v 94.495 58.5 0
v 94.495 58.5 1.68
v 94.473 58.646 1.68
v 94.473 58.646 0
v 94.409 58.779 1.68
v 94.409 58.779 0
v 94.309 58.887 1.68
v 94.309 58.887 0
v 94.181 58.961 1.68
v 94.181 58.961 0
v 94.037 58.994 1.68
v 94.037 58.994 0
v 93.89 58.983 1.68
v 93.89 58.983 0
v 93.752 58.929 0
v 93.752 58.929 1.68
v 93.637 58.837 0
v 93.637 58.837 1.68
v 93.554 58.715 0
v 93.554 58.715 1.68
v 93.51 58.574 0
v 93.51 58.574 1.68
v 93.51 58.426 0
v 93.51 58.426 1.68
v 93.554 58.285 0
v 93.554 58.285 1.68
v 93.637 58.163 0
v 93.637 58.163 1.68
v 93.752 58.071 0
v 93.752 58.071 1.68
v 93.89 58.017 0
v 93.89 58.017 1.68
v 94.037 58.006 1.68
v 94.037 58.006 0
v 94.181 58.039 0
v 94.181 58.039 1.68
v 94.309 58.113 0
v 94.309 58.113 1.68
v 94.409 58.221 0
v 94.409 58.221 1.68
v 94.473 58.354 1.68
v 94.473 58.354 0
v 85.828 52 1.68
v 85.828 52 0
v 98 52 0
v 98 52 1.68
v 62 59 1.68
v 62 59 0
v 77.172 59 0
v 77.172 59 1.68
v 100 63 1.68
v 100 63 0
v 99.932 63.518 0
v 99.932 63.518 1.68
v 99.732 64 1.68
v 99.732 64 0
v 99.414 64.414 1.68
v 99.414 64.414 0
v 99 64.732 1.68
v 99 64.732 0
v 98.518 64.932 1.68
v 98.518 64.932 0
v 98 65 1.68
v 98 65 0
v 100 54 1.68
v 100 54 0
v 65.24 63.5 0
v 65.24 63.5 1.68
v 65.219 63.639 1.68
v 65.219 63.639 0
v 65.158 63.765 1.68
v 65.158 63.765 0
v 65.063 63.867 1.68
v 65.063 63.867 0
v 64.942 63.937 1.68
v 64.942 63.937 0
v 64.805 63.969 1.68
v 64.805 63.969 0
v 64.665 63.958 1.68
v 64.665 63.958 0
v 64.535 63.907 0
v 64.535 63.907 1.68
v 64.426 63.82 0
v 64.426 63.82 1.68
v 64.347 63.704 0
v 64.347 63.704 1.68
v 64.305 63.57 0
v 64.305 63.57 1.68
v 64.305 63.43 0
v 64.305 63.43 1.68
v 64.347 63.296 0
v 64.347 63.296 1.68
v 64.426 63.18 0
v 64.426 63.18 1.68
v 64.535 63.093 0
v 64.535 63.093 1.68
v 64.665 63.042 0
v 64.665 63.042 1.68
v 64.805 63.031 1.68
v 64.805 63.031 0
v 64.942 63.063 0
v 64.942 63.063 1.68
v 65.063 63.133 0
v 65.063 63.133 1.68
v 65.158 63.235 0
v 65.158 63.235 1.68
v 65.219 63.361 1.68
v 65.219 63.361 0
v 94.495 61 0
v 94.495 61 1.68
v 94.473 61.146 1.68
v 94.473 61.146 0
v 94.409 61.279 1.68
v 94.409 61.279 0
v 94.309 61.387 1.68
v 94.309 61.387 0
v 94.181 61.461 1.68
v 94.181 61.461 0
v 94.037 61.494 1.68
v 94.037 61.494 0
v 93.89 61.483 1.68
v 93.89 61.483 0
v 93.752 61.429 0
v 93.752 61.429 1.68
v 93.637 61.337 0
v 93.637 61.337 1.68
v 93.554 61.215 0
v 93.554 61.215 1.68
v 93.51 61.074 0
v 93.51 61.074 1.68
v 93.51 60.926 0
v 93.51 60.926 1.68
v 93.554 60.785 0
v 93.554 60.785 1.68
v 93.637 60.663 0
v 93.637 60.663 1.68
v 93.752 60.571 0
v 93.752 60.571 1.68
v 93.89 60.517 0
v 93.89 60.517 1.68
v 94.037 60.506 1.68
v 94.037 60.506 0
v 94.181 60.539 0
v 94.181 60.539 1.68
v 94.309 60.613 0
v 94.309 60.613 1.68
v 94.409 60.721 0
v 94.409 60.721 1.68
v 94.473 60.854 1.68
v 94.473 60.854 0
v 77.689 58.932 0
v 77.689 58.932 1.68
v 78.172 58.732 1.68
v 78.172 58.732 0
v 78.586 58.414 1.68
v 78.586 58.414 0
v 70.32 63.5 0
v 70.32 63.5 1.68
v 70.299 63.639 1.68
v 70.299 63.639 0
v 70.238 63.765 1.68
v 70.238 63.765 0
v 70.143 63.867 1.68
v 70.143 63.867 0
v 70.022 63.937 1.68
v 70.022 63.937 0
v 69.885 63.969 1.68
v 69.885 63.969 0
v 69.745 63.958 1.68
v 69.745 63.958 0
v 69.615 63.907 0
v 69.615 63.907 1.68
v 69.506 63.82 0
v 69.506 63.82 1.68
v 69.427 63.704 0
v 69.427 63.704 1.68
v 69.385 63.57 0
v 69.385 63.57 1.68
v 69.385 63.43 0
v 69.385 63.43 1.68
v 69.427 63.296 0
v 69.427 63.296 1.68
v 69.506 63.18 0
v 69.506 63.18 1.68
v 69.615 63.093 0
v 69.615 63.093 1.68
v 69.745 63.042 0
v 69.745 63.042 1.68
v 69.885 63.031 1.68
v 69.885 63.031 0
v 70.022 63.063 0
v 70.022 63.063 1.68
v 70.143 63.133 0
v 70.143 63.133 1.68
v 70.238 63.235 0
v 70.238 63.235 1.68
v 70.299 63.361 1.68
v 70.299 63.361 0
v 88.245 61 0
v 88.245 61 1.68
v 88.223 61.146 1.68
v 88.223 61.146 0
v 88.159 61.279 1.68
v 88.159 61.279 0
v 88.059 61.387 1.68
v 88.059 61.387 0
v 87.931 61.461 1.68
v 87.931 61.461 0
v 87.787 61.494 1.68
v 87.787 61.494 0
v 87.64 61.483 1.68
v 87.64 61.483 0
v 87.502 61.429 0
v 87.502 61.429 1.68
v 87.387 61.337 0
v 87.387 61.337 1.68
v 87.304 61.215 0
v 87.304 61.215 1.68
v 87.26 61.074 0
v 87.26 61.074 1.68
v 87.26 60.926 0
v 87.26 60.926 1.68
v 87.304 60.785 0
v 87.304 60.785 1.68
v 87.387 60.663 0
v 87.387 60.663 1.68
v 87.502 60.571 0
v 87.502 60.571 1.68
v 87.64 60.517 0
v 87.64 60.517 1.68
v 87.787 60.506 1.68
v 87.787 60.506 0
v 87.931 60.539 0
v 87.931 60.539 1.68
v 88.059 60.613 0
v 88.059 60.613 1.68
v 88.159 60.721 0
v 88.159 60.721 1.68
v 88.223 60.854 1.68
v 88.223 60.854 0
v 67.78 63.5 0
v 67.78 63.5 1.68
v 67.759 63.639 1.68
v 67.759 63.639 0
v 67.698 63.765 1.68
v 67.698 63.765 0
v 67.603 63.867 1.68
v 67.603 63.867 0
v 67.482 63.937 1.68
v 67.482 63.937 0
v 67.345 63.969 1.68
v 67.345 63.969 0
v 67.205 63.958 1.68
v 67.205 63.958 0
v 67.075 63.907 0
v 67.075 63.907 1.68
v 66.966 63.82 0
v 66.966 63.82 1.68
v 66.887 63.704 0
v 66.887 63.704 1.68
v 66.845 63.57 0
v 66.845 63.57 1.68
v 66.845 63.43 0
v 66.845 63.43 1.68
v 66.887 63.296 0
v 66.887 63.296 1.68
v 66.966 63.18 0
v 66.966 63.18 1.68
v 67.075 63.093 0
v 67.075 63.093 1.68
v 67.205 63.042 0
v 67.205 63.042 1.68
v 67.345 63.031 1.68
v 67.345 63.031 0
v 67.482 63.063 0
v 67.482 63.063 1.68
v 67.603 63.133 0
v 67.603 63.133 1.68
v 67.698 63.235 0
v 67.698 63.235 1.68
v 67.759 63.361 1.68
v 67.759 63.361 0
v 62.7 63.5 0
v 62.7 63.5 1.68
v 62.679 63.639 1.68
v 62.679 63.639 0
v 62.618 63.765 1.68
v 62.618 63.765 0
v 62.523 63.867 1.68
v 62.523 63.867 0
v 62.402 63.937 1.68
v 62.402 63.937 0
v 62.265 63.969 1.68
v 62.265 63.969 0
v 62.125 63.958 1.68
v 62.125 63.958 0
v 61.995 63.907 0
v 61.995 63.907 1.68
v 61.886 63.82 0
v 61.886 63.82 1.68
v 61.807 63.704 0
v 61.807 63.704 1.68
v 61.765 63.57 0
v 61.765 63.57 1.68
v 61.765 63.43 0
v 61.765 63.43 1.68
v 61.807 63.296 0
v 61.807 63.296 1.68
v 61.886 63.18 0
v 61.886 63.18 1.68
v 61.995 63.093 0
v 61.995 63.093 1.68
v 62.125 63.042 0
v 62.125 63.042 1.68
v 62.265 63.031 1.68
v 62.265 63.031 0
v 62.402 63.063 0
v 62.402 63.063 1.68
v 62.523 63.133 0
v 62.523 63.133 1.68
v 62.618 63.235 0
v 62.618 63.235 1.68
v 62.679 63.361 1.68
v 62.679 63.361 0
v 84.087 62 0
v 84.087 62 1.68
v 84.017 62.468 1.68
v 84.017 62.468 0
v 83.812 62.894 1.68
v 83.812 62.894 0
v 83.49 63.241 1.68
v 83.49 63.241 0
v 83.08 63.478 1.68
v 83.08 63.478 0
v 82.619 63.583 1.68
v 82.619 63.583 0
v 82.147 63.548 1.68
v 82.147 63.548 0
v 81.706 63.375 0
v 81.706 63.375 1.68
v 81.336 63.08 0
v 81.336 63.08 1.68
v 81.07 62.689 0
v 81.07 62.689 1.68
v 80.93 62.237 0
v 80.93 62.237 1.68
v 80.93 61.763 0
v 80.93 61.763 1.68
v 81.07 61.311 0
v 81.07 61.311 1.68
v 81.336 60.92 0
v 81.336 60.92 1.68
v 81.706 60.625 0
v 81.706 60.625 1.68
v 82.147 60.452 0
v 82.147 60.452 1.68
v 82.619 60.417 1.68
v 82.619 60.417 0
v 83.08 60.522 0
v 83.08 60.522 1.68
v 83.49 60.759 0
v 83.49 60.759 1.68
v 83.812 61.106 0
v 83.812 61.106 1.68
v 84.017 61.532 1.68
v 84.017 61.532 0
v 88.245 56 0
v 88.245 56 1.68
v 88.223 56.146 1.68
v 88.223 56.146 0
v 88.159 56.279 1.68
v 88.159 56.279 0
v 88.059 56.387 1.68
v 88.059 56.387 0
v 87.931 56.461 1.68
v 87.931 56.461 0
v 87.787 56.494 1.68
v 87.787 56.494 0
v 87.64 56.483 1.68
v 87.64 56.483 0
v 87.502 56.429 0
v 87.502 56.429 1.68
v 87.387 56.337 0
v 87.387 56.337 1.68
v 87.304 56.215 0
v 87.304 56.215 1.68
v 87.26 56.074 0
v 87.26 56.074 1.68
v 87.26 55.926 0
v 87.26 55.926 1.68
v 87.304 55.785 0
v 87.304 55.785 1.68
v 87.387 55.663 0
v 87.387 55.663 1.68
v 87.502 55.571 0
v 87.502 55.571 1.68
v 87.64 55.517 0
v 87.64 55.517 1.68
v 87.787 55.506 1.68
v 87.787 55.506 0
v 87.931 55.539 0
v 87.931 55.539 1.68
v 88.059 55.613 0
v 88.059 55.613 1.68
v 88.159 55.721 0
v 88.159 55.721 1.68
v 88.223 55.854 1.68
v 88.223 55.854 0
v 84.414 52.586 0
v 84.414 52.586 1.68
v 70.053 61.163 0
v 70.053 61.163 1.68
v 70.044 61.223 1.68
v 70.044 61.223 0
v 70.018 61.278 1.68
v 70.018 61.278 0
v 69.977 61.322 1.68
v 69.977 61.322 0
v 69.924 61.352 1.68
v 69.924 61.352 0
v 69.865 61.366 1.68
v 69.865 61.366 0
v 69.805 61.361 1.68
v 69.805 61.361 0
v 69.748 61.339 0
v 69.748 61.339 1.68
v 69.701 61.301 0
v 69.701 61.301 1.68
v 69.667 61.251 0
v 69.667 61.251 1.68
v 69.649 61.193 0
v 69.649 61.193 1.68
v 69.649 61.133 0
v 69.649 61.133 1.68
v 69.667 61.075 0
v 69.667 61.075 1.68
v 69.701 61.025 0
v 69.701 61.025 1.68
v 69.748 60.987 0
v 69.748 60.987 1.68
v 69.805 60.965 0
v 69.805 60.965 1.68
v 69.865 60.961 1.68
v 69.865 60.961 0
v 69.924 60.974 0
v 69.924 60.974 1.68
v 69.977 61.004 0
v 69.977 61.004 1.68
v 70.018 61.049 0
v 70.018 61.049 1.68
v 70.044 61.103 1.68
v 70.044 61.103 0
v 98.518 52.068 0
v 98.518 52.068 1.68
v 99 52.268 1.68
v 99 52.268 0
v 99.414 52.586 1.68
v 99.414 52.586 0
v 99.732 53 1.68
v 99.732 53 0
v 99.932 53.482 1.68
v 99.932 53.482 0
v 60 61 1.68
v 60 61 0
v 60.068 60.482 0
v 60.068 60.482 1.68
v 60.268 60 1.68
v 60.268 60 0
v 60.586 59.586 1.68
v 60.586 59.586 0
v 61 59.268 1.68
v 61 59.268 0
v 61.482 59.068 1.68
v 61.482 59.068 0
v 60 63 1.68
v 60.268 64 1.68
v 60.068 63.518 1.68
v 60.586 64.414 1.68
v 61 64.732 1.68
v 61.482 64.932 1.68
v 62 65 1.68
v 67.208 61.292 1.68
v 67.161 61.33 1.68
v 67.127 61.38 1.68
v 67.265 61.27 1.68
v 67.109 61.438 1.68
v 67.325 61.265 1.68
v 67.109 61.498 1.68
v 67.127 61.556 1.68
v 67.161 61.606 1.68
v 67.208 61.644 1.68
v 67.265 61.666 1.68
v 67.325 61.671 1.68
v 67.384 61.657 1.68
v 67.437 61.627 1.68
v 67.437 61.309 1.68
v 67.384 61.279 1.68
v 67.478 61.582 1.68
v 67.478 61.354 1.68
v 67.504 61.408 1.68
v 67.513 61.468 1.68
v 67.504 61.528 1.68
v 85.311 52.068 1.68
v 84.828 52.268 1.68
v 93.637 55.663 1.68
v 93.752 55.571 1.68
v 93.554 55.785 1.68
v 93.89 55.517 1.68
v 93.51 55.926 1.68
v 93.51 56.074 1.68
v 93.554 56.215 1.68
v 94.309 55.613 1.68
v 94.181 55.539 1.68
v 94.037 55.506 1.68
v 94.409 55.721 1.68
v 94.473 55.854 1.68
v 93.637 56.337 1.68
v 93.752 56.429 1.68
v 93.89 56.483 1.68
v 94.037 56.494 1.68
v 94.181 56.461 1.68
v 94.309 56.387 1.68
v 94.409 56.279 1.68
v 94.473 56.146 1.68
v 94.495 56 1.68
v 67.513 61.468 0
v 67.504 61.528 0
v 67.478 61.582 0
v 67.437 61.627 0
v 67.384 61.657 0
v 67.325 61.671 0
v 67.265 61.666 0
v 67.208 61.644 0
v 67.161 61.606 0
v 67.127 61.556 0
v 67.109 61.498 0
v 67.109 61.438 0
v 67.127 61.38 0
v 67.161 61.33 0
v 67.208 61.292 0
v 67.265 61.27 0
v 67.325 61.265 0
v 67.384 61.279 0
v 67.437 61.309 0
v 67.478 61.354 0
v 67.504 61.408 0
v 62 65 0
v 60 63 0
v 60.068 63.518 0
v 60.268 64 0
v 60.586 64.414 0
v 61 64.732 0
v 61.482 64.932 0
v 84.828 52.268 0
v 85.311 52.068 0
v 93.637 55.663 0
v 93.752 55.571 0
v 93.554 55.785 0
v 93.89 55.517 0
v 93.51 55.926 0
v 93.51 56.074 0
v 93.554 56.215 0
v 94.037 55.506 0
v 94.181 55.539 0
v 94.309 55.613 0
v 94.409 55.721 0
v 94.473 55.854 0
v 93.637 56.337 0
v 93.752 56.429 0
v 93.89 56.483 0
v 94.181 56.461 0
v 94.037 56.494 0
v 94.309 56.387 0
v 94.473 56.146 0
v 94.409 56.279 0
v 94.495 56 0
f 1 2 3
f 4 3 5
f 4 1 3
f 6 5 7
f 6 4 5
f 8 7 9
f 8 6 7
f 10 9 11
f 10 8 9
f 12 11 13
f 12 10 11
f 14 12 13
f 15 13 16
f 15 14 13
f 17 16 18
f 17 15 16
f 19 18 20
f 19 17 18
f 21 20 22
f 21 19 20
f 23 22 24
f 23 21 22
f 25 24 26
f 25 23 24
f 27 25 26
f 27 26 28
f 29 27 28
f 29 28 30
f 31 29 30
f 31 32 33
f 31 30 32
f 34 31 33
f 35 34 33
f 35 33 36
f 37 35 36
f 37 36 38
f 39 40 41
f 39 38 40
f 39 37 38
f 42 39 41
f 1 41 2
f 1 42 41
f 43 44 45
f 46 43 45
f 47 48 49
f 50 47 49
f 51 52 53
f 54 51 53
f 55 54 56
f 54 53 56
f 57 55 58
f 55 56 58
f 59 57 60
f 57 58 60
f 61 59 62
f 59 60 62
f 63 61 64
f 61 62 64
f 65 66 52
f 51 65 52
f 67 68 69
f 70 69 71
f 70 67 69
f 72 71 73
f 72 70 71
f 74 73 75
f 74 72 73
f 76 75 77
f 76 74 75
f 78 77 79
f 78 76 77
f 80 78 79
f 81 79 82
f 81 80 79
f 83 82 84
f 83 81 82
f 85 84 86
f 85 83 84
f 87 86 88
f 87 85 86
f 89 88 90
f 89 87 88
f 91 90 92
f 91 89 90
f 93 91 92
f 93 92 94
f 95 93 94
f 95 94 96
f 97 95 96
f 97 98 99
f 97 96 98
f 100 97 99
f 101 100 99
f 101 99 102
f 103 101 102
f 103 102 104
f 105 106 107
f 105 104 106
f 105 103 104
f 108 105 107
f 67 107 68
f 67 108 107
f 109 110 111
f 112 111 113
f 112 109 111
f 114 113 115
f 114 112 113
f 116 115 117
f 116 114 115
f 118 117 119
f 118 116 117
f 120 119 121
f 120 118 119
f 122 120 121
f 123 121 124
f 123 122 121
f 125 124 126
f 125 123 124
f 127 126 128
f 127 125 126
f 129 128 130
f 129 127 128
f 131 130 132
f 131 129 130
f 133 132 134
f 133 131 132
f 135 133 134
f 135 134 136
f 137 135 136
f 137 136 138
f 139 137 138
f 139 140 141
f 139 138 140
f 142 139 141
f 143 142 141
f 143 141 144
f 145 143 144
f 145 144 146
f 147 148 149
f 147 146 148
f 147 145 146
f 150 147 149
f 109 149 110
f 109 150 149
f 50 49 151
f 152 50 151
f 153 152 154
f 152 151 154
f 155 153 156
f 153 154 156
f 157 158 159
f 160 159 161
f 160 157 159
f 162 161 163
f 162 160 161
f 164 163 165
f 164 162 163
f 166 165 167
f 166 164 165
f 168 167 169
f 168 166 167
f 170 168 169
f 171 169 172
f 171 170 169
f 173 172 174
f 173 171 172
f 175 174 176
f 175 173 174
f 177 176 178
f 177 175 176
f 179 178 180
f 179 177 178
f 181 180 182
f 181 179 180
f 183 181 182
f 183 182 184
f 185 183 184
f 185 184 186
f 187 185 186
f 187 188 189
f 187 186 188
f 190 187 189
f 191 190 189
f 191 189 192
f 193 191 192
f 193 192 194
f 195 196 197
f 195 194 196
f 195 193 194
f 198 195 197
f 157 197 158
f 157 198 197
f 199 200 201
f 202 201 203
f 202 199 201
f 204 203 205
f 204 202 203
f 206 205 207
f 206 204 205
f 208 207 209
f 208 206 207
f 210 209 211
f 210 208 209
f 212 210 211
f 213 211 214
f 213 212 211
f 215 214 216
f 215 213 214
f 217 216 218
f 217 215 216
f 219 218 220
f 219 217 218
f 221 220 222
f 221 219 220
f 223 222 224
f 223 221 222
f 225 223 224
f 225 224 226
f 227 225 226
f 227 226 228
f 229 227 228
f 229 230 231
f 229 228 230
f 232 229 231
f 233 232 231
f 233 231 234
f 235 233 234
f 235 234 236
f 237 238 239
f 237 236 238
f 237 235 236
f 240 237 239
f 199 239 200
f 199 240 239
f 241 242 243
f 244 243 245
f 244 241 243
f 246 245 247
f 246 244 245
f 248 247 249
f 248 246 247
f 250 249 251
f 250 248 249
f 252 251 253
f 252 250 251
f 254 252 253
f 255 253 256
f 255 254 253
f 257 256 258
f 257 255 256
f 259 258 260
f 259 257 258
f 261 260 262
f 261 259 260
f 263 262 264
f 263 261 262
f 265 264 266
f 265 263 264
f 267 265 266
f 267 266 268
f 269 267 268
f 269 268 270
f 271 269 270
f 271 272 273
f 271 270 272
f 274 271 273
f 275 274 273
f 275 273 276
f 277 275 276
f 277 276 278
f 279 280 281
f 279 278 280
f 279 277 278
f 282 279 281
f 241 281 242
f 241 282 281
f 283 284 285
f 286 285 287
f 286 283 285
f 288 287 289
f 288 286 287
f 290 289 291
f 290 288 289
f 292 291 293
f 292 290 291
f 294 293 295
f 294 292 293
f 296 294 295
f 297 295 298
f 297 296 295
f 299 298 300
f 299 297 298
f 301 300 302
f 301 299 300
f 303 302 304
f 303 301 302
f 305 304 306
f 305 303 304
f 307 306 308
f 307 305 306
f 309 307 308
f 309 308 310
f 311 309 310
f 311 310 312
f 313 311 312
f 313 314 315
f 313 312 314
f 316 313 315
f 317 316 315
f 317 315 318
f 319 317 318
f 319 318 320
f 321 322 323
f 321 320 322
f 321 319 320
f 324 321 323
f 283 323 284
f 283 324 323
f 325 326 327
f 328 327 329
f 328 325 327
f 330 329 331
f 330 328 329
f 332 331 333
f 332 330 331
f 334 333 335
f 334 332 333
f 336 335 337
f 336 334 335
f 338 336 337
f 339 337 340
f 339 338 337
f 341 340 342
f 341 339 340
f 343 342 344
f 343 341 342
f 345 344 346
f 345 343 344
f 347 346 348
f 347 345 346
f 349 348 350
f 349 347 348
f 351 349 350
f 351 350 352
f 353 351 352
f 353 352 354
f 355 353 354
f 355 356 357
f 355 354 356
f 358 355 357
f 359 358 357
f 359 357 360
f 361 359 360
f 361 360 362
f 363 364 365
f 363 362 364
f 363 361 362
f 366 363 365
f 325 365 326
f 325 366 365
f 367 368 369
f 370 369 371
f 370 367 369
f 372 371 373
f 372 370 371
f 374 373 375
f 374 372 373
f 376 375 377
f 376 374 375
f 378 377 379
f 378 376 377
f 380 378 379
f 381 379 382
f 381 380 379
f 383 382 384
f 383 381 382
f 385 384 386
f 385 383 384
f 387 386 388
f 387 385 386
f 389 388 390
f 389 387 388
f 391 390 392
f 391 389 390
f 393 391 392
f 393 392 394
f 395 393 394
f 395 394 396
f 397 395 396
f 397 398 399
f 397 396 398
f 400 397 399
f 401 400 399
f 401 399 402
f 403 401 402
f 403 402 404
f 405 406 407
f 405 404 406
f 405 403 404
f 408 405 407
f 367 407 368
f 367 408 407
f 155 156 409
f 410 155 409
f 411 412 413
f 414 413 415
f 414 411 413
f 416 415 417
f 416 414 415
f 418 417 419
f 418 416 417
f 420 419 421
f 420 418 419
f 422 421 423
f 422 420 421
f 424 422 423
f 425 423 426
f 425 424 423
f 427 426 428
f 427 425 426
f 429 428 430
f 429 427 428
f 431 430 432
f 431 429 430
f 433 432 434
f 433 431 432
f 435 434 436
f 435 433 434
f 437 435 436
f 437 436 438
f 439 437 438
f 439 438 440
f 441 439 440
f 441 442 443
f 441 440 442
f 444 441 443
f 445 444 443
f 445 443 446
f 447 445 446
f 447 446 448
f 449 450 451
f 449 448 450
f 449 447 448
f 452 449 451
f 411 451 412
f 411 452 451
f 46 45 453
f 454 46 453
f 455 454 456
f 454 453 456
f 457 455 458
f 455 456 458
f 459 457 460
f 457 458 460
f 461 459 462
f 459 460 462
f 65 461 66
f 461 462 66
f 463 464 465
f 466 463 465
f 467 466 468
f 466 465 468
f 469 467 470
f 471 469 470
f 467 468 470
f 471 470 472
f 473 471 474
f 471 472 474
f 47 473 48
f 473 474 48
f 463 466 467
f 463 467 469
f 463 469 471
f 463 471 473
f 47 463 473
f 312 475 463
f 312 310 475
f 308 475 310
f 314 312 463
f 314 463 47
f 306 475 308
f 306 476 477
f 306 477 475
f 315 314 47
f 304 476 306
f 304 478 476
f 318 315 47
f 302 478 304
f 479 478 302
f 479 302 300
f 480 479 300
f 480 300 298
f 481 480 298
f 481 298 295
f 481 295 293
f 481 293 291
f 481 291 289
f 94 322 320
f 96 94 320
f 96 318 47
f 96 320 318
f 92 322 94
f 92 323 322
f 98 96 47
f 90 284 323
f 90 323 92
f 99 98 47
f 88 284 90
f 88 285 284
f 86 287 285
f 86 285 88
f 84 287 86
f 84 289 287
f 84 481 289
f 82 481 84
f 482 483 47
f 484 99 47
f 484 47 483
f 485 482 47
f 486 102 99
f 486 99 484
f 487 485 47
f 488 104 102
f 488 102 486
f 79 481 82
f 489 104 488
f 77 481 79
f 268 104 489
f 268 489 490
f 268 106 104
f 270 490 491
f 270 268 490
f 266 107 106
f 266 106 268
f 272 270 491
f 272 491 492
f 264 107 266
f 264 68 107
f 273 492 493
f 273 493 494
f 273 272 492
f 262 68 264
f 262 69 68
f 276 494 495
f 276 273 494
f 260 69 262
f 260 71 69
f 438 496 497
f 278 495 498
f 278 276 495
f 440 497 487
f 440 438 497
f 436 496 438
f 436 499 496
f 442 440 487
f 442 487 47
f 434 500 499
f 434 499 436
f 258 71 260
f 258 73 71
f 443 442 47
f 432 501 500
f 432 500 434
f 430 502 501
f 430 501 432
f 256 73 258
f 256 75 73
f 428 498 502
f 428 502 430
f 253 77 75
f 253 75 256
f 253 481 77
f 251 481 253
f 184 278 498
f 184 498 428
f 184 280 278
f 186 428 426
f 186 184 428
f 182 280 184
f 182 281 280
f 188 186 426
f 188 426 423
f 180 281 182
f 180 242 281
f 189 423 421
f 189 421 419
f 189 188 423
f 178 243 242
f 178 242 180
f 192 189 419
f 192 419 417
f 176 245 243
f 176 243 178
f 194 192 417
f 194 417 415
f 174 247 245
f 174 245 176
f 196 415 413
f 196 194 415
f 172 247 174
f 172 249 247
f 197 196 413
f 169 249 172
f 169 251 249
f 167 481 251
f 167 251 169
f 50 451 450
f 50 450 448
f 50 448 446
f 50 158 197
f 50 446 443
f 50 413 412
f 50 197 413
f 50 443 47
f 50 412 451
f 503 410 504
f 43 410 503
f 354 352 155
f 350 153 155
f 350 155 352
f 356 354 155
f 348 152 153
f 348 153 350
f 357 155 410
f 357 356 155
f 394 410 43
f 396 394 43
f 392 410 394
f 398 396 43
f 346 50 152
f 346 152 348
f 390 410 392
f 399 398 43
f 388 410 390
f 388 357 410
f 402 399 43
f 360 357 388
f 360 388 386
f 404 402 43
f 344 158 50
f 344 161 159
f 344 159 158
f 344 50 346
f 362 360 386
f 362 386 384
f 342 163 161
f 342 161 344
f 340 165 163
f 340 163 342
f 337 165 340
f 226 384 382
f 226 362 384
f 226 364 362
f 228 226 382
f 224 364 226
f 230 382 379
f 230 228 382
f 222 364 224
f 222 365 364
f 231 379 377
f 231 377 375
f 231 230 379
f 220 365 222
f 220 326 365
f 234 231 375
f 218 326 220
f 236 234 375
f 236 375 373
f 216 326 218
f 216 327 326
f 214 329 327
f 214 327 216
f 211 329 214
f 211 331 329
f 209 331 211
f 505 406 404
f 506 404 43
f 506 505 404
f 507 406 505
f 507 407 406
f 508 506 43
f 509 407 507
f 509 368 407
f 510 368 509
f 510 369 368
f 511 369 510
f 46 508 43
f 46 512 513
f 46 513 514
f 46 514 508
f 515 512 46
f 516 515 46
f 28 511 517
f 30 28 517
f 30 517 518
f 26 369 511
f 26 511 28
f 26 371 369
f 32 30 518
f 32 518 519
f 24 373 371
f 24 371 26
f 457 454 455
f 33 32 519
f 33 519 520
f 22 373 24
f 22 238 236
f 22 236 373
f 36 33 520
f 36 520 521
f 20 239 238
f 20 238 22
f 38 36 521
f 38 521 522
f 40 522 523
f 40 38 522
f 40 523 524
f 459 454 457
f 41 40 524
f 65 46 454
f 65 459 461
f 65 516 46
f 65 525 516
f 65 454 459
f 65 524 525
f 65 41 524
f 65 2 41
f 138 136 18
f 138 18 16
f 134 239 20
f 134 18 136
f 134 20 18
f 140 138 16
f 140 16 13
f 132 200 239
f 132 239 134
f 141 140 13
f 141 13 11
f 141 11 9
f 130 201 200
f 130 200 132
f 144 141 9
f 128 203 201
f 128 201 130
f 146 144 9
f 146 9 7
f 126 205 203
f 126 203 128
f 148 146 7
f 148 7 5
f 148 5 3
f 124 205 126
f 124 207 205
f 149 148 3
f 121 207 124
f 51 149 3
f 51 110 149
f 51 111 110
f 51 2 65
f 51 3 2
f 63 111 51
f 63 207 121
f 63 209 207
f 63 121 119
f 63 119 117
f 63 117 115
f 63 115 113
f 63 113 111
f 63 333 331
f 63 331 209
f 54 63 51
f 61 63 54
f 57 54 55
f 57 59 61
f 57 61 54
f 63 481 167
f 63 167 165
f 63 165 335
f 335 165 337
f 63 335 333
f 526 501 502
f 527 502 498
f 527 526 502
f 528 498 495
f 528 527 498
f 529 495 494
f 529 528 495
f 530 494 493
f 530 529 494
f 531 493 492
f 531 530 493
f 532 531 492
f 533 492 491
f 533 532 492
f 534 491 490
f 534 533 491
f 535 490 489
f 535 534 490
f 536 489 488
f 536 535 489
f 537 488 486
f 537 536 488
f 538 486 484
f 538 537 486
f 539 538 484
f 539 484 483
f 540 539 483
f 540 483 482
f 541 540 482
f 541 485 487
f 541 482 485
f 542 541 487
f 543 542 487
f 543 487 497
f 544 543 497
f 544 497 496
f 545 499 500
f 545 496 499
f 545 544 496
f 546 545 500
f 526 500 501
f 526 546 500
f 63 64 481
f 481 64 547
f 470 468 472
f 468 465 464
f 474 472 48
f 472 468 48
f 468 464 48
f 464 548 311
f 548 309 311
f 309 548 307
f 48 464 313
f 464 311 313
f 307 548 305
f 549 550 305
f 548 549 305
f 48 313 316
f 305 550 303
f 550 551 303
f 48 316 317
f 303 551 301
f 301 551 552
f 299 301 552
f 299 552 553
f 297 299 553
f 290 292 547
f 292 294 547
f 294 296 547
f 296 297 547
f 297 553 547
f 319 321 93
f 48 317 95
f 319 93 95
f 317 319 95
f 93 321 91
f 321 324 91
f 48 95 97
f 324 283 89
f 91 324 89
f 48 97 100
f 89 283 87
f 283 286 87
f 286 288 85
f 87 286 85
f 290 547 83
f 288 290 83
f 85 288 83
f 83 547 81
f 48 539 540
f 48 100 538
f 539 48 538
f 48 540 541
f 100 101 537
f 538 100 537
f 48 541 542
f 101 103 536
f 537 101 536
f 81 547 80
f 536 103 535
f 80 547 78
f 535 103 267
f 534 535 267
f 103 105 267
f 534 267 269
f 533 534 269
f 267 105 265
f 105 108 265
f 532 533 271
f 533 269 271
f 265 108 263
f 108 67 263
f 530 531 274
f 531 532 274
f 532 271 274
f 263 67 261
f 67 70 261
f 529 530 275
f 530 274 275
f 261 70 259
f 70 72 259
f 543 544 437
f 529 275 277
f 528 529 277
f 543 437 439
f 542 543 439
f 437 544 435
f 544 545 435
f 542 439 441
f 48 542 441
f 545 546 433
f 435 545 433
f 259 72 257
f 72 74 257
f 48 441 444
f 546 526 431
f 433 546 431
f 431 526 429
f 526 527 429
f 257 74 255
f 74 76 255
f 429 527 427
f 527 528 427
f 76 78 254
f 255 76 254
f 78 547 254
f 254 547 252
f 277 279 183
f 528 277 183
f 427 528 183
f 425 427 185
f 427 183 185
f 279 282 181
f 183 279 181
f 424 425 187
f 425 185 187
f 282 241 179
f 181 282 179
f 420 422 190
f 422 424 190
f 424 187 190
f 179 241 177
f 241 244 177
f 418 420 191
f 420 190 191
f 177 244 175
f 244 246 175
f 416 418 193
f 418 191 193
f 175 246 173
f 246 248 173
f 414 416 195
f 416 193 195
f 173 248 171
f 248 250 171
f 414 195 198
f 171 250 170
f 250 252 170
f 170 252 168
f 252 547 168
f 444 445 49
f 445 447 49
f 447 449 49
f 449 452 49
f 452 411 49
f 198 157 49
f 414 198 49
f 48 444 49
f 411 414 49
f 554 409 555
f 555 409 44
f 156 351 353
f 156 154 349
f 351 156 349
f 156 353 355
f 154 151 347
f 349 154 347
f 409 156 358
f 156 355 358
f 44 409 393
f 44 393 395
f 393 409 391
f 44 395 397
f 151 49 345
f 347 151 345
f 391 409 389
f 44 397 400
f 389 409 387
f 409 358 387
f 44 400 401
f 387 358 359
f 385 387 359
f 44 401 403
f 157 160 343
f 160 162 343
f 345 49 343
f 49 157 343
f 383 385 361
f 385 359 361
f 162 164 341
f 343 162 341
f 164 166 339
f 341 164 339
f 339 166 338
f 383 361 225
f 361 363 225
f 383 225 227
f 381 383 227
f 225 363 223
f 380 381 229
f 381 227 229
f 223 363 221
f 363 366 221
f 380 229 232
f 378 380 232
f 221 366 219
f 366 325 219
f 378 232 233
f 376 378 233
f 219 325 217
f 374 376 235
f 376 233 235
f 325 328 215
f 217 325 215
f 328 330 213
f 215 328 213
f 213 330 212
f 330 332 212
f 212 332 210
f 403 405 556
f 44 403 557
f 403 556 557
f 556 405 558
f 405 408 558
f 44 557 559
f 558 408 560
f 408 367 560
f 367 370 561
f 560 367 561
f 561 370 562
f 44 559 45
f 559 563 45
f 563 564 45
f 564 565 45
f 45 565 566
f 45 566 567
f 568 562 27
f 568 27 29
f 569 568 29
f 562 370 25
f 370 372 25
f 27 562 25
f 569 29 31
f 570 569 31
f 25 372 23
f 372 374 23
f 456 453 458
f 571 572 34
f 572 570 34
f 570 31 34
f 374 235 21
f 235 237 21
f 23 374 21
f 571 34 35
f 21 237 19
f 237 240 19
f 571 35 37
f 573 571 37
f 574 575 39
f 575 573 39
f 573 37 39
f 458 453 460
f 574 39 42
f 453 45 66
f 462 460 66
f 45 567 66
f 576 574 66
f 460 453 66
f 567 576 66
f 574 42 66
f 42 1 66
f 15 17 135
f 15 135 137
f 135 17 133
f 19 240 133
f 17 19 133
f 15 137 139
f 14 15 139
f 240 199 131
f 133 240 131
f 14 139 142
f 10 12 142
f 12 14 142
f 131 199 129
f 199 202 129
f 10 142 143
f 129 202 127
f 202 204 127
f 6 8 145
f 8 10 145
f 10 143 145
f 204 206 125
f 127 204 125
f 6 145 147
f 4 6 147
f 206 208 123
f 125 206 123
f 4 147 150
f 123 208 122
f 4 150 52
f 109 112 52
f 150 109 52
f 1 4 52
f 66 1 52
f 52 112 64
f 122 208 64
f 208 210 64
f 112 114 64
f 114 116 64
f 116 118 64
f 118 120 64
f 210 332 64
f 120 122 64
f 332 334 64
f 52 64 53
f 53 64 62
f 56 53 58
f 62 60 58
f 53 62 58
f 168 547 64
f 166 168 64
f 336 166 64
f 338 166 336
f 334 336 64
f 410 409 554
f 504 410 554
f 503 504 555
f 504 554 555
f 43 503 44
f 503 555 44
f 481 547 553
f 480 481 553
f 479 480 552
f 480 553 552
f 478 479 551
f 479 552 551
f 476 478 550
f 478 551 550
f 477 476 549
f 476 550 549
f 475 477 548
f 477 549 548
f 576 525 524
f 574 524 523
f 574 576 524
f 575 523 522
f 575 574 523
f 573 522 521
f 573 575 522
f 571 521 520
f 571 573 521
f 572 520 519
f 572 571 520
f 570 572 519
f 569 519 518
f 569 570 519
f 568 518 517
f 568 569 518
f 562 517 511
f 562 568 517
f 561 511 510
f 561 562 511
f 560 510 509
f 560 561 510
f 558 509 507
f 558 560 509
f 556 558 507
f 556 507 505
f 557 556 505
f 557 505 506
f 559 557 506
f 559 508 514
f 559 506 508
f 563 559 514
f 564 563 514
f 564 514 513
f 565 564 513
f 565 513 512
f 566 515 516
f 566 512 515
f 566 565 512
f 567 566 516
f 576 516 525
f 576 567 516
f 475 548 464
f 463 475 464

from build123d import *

# Parameters (mm, degrees)
BOARD_DEPTH        = 1.68
SKETCH2_R          = 0.2032
SKETCH2_R_2        = 0.4699
SKETCH2_R_3        = 1.5875
SKETCH2_R_4        = 0.4953
PLATED_HOLES_DEPTH = 2.68


with BuildPart() as part:
    # Sketch1 → BOARD (new body)
    with BuildSketch(Plane.XY):
        with BuildLine():
            Line((60, 63), (60, 61))
            ThreePointArc((60, 61), (60.585786438, 59.585786438), (62, 59))
            Line((62, 59), (77.171572667, 59))
            ThreePointArc((77.171572667, 59), (77.936939773, 58.847758994), (78.585786667, 58.414213333))
            Line((78.585786667, 58.414213333), (84.414213333, 52.585786667))
            ThreePointArc((84.414213333, 52.585786667), (85.063060227, 52.152241006), (85.828427333, 52))
            Line((85.828427333, 52), (98, 52))
            ThreePointArc((98, 52), (99.414213562, 52.585786438), (100, 54))
            Line((100, 54), (100, 63))
            ThreePointArc((100, 63), (99.414213562, 64.414213562), (98, 65))
            Line((98, 65), (62, 65))
            ThreePointArc((62, 65), (60.585786438, 64.414213562), (60, 63))
        make_face()
    extrude(amount=BOARD_DEPTH)

    # Sketch2 → PLATED HOLES (cut, through all)
    with BuildSketch(Plane.XY):
        with Locations((67.31, 61.468)):
            Circle(SKETCH2_R)
        with Locations((62.23, 63.5)):
            Circle(SKETCH2_R_2)
        with Locations((64.77, 63.5)):
            Circle(SKETCH2_R_2)
        with Locations((67.31, 63.5)):
            Circle(SKETCH2_R_2)
        with Locations((69.85, 61.1632)):
            Circle(SKETCH2_R)
        with Locations((69.85, 63.5)):
            Circle(SKETCH2_R_2)
        with Locations((82.499999998, 62.000000003)):
            Circle(SKETCH2_R_3)
        with Locations((87.749999989, 55.999999989)):
            Circle(SKETCH2_R_4)
        with Locations((87.749999989, 60.999999996)):
            Circle(SKETCH2_R_4)
        with Locations((94.000000011, 58.499999992)):
            Circle(SKETCH2_R_4)
        with Locations((94.000000011, 55.999999989)):
            Circle(SKETCH2_R_4)
        with Locations((94.000000011, 60.999999996)):
            Circle(SKETCH2_R_4)
    extrude(amount=PLATED_HOLES_DEPTH, mode=Mode.SUBTRACT)


solid = part.part
